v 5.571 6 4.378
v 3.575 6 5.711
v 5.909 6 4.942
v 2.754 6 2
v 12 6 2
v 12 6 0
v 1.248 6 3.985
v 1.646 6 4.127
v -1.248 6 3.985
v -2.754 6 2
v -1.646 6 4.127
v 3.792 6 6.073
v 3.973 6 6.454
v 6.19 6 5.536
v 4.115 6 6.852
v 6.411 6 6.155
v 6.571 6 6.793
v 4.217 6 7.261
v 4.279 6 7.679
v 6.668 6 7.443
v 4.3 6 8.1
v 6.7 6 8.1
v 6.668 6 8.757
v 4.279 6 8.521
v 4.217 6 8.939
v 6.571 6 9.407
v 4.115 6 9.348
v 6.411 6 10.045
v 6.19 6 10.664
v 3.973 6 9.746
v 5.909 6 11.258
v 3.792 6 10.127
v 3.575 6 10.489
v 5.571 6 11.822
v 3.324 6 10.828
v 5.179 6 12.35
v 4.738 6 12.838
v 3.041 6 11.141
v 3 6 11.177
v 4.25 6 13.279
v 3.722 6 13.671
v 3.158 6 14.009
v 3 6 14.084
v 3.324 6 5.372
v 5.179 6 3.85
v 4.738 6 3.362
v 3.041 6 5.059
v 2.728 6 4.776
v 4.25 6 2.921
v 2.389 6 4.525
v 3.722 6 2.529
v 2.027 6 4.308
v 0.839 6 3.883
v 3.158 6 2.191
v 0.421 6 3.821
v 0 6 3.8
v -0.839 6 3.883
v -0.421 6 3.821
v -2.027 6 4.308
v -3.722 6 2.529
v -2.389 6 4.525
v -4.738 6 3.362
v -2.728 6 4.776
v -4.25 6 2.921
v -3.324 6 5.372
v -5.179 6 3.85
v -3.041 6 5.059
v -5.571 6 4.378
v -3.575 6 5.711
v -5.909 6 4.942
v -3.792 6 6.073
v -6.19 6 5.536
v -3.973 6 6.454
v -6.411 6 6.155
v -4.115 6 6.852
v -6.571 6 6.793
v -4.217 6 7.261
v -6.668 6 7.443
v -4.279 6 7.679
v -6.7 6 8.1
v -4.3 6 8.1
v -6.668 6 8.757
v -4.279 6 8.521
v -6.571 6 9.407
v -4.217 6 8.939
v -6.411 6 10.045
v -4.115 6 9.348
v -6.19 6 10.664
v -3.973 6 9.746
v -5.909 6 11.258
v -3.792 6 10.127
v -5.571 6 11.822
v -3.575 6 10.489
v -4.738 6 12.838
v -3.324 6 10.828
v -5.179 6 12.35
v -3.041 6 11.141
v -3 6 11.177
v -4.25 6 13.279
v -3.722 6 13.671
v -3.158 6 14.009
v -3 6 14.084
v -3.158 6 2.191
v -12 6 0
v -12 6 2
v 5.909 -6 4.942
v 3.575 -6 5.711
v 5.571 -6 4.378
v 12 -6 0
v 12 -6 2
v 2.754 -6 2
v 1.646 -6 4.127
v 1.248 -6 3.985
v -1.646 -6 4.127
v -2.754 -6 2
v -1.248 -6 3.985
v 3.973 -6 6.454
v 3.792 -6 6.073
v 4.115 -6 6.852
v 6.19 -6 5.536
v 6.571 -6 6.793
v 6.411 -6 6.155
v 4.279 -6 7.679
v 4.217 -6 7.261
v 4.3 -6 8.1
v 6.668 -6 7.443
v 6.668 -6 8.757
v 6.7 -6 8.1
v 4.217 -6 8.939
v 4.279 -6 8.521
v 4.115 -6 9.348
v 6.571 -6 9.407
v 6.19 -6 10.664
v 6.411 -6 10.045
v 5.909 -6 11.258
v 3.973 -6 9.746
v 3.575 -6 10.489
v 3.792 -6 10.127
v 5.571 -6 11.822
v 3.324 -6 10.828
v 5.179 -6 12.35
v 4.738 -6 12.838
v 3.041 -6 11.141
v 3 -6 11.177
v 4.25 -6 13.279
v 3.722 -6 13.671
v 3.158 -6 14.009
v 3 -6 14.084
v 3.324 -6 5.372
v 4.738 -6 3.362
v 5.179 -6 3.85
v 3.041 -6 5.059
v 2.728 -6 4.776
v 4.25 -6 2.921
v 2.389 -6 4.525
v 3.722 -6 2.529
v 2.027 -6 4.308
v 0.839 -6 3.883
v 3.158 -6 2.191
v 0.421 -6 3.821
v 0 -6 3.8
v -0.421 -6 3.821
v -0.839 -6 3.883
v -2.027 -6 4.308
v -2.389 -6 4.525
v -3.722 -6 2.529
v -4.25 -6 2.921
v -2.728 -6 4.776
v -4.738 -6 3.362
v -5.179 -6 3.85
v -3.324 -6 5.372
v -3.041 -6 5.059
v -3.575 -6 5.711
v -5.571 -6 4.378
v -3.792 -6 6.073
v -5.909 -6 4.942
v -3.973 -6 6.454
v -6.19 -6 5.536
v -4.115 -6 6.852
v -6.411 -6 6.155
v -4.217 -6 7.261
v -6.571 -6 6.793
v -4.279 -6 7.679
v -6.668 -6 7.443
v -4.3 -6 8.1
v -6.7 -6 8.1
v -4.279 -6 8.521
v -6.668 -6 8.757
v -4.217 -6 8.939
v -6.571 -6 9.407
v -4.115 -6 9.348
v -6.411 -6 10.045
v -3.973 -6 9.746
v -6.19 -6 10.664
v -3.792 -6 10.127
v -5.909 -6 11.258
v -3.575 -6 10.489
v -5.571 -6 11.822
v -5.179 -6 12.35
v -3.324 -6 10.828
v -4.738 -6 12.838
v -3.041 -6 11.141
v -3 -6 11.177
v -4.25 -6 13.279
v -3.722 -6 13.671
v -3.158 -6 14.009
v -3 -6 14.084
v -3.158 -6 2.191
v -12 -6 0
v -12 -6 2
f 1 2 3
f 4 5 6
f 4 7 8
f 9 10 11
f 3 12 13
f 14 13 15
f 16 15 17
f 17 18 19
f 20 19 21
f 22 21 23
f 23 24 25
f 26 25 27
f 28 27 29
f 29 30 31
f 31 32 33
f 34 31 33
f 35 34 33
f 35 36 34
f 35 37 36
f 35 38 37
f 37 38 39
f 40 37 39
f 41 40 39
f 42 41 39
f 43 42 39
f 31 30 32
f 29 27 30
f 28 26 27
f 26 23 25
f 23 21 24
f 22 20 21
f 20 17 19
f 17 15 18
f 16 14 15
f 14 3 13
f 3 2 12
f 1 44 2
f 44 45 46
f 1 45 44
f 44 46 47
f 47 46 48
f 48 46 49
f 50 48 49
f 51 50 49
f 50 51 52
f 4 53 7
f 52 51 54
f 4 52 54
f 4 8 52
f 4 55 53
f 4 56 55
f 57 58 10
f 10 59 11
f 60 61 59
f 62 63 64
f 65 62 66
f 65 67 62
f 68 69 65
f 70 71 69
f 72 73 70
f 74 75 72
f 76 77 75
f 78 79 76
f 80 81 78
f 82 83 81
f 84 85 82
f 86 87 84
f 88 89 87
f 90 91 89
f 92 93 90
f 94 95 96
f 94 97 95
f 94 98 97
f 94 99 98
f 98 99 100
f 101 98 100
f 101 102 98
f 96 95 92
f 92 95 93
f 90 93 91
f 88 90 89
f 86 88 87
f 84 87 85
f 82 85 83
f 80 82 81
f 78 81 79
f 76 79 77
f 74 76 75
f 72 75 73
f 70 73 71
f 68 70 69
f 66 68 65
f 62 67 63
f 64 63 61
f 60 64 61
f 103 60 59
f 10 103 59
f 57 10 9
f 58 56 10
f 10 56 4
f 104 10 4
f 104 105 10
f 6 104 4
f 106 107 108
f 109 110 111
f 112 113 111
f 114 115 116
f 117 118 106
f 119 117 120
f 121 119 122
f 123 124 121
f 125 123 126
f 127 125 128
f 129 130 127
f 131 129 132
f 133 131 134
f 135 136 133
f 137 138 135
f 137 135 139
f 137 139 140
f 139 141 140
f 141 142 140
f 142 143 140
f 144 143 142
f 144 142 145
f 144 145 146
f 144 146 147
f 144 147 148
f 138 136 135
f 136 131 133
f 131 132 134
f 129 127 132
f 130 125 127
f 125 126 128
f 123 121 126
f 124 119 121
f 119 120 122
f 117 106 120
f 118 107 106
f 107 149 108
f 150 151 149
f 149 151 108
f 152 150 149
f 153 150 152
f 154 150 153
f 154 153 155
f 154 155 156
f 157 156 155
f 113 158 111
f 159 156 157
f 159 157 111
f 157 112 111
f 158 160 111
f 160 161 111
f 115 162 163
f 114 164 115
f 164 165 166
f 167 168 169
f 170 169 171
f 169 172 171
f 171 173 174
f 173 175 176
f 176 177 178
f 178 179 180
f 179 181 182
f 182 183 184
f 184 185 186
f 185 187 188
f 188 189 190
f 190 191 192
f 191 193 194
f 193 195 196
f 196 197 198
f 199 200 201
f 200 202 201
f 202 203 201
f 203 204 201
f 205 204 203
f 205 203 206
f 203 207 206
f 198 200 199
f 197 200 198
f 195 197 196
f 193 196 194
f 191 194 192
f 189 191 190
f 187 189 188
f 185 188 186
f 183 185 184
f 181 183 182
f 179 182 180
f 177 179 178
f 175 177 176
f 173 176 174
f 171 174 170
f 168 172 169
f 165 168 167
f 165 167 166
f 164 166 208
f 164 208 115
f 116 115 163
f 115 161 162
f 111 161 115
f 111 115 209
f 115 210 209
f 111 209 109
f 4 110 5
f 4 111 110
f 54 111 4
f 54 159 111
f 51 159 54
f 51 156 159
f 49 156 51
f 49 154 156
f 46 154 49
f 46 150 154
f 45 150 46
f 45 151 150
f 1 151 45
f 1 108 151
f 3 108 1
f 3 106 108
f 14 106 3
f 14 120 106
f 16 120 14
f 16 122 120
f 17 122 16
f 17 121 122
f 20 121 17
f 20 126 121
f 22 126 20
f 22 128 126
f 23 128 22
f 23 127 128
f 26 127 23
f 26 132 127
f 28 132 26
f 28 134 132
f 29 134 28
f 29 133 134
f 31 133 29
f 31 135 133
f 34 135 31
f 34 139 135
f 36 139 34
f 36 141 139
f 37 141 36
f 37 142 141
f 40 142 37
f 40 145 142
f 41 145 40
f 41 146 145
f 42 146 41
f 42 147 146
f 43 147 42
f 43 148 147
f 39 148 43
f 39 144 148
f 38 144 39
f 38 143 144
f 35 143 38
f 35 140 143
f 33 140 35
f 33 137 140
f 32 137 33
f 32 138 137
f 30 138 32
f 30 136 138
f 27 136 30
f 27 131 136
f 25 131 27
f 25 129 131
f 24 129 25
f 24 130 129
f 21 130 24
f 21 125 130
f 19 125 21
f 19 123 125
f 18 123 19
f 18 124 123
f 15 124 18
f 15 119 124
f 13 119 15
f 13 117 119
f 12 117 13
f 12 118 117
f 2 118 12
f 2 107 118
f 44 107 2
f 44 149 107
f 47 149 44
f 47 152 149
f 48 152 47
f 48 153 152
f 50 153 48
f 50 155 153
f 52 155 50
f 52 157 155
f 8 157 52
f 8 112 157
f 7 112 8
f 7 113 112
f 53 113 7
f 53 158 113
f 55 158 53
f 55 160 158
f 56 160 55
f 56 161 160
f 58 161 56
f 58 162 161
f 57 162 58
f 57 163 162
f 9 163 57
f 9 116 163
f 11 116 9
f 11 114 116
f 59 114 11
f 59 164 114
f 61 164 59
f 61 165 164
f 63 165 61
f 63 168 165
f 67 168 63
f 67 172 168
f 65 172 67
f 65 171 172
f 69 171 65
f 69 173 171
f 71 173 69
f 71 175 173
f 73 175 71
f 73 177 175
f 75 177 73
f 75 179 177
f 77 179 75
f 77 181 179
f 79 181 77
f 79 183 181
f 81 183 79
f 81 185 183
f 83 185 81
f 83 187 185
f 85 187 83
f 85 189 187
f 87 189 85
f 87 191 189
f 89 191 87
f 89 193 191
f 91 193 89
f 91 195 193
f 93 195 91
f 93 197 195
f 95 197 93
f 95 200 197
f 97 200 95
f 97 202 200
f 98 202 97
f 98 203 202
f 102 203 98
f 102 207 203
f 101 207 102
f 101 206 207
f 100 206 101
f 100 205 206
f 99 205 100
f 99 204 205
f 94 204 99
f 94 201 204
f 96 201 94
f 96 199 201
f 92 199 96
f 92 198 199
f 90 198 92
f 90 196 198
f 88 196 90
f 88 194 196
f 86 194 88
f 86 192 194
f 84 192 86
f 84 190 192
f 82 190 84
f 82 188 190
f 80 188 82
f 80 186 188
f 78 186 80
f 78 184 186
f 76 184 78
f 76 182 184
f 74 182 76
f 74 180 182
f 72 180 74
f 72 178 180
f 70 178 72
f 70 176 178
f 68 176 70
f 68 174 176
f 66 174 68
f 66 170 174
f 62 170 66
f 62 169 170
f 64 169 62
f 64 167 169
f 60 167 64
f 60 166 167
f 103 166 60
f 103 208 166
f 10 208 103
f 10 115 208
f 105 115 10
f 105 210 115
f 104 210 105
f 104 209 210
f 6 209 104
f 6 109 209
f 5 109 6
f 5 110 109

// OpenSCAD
// Forge catalog: cable clip (C-clip with a flat base for adhesive or a screw)
cable_dia = 8;    // cable diameter it holds (mm)
width     = 12;   // clip width (mm)
wall      = 2.4;  // wall thickness (mm)
base_len  = 24;   // length of the flat base (mm)
base_th   = 2;    // base thickness (mm)
opening   = 0.75; // fraction of the cable diameter left open at the top (0.5-0.9)
$fn = 64;

r_in  = cable_dia / 2 + 0.3;
r_out = r_in + wall;
cy    = base_th + r_out - 0.6;   // ring overlaps the base slightly so the union is manifold
module profile() {
    translate([-base_len/2, 0]) square([base_len, base_th]);
    difference() {
        translate([0, cy]) circle(r = r_out);
        translate([0, cy]) circle(r = r_in);
        translate([-cable_dia * opening / 2, cy]) square([cable_dia * opening, r_out + 1]);
    }
}
rotate([90, 0, 0]) linear_extrude(height = width, center = true) profile();
